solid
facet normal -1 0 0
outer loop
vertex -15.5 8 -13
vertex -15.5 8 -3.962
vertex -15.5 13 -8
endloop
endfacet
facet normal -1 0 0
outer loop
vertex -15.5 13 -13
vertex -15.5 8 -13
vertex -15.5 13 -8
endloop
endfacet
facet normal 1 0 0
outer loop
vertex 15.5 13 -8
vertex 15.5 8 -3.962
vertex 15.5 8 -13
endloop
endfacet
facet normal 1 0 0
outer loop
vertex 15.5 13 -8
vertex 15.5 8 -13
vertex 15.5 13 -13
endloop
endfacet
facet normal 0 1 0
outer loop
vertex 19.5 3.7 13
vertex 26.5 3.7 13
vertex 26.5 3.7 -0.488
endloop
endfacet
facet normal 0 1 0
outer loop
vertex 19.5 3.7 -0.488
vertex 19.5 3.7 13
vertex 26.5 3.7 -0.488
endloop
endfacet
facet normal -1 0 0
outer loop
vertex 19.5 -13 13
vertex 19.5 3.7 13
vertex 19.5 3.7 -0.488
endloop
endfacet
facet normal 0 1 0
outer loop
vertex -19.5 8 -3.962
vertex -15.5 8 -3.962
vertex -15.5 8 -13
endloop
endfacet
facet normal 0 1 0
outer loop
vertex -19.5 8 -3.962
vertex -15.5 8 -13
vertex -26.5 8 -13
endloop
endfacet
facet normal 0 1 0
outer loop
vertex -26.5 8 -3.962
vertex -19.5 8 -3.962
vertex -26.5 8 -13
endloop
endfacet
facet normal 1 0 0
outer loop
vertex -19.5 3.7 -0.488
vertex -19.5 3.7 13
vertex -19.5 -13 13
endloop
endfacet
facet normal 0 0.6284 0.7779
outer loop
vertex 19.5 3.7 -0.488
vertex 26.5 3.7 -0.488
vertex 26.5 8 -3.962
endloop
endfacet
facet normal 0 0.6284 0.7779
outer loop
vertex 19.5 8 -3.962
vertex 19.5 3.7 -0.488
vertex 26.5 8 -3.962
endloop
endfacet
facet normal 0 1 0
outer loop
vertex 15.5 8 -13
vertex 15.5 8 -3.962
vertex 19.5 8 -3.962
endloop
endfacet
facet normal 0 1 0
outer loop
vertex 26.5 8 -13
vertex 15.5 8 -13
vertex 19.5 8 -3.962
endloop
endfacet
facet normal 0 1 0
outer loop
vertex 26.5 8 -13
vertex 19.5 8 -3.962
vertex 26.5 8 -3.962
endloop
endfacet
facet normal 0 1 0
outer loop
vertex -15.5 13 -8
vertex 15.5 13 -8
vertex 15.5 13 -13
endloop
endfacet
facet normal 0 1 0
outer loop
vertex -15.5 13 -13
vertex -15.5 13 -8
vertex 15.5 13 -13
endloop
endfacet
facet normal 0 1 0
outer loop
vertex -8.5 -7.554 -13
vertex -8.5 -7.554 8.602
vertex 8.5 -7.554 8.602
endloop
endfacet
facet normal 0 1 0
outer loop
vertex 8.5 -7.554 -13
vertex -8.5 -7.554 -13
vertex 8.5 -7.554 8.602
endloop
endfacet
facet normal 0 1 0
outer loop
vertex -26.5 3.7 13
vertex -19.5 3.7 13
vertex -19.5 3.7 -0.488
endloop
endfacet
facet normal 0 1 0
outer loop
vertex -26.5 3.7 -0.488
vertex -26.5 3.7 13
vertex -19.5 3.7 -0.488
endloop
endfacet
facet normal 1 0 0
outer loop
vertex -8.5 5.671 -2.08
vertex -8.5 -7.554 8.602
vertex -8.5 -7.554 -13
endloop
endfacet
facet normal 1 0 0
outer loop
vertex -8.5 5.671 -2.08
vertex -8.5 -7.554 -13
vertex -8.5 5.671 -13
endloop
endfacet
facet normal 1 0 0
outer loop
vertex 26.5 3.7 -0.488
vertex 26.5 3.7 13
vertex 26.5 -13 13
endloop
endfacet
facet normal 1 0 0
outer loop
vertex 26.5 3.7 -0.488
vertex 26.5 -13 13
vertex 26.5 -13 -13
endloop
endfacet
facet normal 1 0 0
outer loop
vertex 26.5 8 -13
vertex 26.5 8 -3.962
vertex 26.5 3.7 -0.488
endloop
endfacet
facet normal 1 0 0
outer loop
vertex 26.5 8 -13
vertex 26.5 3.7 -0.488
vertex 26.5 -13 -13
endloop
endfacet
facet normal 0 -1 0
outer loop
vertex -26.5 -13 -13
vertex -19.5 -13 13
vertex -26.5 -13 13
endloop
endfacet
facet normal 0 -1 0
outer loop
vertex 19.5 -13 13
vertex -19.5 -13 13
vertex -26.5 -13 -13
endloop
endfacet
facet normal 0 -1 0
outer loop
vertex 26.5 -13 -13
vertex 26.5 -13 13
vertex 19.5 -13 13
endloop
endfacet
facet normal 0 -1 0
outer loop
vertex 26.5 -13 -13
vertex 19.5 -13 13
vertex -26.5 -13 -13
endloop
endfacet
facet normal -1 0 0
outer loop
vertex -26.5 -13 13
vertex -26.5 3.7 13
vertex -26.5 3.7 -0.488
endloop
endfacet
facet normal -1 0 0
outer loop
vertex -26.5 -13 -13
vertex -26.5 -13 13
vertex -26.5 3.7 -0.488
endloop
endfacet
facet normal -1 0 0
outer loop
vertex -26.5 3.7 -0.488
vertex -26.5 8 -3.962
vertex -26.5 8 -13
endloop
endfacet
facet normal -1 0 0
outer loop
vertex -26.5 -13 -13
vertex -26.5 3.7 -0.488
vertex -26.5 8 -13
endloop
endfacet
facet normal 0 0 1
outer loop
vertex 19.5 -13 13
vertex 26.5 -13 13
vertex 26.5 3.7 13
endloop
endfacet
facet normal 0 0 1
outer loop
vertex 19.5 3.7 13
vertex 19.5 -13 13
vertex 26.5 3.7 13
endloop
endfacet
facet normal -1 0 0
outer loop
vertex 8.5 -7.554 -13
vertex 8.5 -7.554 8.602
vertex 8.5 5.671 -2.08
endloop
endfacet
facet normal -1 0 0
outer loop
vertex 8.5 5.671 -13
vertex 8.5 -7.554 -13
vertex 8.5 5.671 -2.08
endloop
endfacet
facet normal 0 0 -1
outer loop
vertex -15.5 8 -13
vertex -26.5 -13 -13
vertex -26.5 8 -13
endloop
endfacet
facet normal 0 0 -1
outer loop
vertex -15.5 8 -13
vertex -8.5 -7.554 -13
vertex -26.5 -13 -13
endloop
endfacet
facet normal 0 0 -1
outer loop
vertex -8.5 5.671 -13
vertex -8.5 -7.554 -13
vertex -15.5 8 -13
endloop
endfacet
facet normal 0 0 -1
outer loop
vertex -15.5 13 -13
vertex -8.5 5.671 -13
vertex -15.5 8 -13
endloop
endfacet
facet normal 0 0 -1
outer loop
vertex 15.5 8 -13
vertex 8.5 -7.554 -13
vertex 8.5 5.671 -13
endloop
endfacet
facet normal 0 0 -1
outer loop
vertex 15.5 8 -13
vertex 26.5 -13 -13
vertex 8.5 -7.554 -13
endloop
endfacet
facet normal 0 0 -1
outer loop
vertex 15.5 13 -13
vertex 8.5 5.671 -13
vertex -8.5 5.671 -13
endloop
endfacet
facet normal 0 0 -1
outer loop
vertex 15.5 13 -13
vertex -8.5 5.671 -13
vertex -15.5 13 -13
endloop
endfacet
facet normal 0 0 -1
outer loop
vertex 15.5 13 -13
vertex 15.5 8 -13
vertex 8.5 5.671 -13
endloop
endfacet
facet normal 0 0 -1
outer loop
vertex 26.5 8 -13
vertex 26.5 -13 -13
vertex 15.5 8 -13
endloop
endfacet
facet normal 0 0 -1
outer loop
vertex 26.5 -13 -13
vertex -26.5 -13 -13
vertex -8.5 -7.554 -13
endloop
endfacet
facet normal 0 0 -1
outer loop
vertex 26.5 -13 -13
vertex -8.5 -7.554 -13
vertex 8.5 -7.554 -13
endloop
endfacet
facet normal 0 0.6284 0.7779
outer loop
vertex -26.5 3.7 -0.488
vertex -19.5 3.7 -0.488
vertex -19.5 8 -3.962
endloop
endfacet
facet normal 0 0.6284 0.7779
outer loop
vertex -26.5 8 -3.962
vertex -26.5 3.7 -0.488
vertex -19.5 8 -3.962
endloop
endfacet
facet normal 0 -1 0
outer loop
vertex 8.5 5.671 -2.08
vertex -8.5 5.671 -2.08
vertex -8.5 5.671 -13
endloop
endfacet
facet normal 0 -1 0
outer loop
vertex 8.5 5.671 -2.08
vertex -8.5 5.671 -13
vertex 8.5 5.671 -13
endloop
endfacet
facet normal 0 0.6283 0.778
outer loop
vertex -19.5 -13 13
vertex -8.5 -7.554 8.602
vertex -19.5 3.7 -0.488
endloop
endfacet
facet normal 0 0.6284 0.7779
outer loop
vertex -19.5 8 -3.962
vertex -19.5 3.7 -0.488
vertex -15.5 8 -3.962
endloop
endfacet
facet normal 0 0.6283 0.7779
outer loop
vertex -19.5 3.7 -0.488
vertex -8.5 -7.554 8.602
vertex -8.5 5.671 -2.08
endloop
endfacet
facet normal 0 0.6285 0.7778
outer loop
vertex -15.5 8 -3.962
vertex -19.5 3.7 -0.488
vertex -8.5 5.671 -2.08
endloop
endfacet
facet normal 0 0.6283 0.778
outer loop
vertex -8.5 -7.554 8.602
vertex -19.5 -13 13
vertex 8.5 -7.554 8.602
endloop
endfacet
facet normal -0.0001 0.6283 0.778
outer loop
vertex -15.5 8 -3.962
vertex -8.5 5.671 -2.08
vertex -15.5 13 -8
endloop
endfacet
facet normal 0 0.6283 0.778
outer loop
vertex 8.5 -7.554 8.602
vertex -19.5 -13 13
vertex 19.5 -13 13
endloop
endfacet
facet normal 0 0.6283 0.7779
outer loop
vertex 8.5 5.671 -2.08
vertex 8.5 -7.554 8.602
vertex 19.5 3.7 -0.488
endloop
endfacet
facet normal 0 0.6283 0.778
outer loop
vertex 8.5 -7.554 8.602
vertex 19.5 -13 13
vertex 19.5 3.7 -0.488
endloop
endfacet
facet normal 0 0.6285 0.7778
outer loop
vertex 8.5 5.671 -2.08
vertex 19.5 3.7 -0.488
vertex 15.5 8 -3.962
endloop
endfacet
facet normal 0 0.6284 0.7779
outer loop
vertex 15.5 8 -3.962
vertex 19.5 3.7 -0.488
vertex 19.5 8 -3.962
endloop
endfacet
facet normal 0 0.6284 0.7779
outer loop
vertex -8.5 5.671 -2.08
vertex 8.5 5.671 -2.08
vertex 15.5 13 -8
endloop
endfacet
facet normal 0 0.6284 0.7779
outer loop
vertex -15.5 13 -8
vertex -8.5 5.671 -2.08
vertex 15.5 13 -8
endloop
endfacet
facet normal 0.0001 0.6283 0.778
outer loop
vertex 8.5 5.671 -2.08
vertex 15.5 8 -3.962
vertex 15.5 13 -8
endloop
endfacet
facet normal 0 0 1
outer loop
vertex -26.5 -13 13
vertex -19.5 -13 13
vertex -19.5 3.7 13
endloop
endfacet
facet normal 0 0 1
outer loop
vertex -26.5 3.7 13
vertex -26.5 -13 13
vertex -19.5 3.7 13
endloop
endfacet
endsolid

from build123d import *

# Parameters (mm, degrees)
ESQUISSE1_W             = 26
ESQUISSE1_H             = 26
BOSS_EXTRU_1_DEPTH      = 26.5
ENL_V_MAT_EXTRU_1_DEPTH = 19.5
ESQUISSE4_W             = 11
ESQUISSE4_H             = 10
ENL_V_MAT_EXTRU_2_DEPTH = 40.33509883
ENL_V_MAT_EXTRU_3_DEPTH = 57.098128311
ESQUISSE6_W             = 17
ESQUISSE6_H             = 17
ENL_V_MAT_EXTRU_4_DEPTH = 44.211248008


with BuildPart() as part:
    # Esquisse1 → Boss.-Extru.1 (new, symmetric)
    with BuildSketch(Plane(origin=(0, 0, 0), x_dir=(0, 0, -1), z_dir=(1, 0, 0))):
        Rectangle(ESQUISSE1_W, ESQUISSE1_H)
    extrude(amount=BOSS_EXTRU_1_DEPTH, both=True)

    # Esquisse3 → Enlèv. mat.-Extru.1 (cut, symmetric)
    with BuildSketch(Plane(origin=(0, 0, 0), x_dir=(0, 0, -1), z_dir=(1, 0, 0))):
        Polygon((-13, -13), (8, 13), (-13, 13), align=None)
    extrude(amount=ENL_V_MAT_EXTRU_1_DEPTH, both=True, mode=Mode.SUBTRACT)

    # Esquisse4 → Enlèv. mat.-Extru.2 (cut, through all)
    with BuildSketch(Plane.XY.offset(13)):
        with Locations((21, 13)):
            Rectangle(ESQUISSE4_W, ESQUISSE4_H)
    enl_v_mat_extru_2 = extrude(amount=-ENL_V_MAT_EXTRU_2_DEPTH, mode=Mode.SUBTRACT)

    # Symétrie1: Enlèv. mat.-Extru.2 across plane
    add(enl_v_mat_extru_2.mirror(Plane(origin=(0, 0, 0), x_dir=(0, 0, 1), z_dir=(1, 0, 0))), mode=Mode.SUBTRACT)

    # Esquisse5 → Enlèv. mat.-Extru.3 (cut, through all)
    with BuildSketch(Plane(origin=(26.5, 0, 0), x_dir=(0, 0, -1), z_dir=(1, 0, 0))):
        Polygon((-13, 3.7), (0.488461538, 3.7), (3.961538462, 8), (-13, 8), align=None)
    extrude(amount=-ENL_V_MAT_EXTRU_3_DEPTH, mode=Mode.SUBTRACT)

    # Esquisse6 → Enlèv. mat.-Extru.4 (cut, through all, along a direction that is not the sketch's normal)
    with BuildSketch(Plane(origin=(0, 1.222023277, 1.5129812), x_dir=(1, 0, 0), z_dir=(0, 0.6283371070876215, 0.7779411802037214))):
        with Locations((0, -2.781617735)):
            Rectangle(ESQUISSE6_W, ESQUISSE6_H)
    extrude(amount=-ENL_V_MAT_EXTRU_4_DEPTH, dir=(0, 0, 1), mode=Mode.SUBTRACT)


solid = part.part
